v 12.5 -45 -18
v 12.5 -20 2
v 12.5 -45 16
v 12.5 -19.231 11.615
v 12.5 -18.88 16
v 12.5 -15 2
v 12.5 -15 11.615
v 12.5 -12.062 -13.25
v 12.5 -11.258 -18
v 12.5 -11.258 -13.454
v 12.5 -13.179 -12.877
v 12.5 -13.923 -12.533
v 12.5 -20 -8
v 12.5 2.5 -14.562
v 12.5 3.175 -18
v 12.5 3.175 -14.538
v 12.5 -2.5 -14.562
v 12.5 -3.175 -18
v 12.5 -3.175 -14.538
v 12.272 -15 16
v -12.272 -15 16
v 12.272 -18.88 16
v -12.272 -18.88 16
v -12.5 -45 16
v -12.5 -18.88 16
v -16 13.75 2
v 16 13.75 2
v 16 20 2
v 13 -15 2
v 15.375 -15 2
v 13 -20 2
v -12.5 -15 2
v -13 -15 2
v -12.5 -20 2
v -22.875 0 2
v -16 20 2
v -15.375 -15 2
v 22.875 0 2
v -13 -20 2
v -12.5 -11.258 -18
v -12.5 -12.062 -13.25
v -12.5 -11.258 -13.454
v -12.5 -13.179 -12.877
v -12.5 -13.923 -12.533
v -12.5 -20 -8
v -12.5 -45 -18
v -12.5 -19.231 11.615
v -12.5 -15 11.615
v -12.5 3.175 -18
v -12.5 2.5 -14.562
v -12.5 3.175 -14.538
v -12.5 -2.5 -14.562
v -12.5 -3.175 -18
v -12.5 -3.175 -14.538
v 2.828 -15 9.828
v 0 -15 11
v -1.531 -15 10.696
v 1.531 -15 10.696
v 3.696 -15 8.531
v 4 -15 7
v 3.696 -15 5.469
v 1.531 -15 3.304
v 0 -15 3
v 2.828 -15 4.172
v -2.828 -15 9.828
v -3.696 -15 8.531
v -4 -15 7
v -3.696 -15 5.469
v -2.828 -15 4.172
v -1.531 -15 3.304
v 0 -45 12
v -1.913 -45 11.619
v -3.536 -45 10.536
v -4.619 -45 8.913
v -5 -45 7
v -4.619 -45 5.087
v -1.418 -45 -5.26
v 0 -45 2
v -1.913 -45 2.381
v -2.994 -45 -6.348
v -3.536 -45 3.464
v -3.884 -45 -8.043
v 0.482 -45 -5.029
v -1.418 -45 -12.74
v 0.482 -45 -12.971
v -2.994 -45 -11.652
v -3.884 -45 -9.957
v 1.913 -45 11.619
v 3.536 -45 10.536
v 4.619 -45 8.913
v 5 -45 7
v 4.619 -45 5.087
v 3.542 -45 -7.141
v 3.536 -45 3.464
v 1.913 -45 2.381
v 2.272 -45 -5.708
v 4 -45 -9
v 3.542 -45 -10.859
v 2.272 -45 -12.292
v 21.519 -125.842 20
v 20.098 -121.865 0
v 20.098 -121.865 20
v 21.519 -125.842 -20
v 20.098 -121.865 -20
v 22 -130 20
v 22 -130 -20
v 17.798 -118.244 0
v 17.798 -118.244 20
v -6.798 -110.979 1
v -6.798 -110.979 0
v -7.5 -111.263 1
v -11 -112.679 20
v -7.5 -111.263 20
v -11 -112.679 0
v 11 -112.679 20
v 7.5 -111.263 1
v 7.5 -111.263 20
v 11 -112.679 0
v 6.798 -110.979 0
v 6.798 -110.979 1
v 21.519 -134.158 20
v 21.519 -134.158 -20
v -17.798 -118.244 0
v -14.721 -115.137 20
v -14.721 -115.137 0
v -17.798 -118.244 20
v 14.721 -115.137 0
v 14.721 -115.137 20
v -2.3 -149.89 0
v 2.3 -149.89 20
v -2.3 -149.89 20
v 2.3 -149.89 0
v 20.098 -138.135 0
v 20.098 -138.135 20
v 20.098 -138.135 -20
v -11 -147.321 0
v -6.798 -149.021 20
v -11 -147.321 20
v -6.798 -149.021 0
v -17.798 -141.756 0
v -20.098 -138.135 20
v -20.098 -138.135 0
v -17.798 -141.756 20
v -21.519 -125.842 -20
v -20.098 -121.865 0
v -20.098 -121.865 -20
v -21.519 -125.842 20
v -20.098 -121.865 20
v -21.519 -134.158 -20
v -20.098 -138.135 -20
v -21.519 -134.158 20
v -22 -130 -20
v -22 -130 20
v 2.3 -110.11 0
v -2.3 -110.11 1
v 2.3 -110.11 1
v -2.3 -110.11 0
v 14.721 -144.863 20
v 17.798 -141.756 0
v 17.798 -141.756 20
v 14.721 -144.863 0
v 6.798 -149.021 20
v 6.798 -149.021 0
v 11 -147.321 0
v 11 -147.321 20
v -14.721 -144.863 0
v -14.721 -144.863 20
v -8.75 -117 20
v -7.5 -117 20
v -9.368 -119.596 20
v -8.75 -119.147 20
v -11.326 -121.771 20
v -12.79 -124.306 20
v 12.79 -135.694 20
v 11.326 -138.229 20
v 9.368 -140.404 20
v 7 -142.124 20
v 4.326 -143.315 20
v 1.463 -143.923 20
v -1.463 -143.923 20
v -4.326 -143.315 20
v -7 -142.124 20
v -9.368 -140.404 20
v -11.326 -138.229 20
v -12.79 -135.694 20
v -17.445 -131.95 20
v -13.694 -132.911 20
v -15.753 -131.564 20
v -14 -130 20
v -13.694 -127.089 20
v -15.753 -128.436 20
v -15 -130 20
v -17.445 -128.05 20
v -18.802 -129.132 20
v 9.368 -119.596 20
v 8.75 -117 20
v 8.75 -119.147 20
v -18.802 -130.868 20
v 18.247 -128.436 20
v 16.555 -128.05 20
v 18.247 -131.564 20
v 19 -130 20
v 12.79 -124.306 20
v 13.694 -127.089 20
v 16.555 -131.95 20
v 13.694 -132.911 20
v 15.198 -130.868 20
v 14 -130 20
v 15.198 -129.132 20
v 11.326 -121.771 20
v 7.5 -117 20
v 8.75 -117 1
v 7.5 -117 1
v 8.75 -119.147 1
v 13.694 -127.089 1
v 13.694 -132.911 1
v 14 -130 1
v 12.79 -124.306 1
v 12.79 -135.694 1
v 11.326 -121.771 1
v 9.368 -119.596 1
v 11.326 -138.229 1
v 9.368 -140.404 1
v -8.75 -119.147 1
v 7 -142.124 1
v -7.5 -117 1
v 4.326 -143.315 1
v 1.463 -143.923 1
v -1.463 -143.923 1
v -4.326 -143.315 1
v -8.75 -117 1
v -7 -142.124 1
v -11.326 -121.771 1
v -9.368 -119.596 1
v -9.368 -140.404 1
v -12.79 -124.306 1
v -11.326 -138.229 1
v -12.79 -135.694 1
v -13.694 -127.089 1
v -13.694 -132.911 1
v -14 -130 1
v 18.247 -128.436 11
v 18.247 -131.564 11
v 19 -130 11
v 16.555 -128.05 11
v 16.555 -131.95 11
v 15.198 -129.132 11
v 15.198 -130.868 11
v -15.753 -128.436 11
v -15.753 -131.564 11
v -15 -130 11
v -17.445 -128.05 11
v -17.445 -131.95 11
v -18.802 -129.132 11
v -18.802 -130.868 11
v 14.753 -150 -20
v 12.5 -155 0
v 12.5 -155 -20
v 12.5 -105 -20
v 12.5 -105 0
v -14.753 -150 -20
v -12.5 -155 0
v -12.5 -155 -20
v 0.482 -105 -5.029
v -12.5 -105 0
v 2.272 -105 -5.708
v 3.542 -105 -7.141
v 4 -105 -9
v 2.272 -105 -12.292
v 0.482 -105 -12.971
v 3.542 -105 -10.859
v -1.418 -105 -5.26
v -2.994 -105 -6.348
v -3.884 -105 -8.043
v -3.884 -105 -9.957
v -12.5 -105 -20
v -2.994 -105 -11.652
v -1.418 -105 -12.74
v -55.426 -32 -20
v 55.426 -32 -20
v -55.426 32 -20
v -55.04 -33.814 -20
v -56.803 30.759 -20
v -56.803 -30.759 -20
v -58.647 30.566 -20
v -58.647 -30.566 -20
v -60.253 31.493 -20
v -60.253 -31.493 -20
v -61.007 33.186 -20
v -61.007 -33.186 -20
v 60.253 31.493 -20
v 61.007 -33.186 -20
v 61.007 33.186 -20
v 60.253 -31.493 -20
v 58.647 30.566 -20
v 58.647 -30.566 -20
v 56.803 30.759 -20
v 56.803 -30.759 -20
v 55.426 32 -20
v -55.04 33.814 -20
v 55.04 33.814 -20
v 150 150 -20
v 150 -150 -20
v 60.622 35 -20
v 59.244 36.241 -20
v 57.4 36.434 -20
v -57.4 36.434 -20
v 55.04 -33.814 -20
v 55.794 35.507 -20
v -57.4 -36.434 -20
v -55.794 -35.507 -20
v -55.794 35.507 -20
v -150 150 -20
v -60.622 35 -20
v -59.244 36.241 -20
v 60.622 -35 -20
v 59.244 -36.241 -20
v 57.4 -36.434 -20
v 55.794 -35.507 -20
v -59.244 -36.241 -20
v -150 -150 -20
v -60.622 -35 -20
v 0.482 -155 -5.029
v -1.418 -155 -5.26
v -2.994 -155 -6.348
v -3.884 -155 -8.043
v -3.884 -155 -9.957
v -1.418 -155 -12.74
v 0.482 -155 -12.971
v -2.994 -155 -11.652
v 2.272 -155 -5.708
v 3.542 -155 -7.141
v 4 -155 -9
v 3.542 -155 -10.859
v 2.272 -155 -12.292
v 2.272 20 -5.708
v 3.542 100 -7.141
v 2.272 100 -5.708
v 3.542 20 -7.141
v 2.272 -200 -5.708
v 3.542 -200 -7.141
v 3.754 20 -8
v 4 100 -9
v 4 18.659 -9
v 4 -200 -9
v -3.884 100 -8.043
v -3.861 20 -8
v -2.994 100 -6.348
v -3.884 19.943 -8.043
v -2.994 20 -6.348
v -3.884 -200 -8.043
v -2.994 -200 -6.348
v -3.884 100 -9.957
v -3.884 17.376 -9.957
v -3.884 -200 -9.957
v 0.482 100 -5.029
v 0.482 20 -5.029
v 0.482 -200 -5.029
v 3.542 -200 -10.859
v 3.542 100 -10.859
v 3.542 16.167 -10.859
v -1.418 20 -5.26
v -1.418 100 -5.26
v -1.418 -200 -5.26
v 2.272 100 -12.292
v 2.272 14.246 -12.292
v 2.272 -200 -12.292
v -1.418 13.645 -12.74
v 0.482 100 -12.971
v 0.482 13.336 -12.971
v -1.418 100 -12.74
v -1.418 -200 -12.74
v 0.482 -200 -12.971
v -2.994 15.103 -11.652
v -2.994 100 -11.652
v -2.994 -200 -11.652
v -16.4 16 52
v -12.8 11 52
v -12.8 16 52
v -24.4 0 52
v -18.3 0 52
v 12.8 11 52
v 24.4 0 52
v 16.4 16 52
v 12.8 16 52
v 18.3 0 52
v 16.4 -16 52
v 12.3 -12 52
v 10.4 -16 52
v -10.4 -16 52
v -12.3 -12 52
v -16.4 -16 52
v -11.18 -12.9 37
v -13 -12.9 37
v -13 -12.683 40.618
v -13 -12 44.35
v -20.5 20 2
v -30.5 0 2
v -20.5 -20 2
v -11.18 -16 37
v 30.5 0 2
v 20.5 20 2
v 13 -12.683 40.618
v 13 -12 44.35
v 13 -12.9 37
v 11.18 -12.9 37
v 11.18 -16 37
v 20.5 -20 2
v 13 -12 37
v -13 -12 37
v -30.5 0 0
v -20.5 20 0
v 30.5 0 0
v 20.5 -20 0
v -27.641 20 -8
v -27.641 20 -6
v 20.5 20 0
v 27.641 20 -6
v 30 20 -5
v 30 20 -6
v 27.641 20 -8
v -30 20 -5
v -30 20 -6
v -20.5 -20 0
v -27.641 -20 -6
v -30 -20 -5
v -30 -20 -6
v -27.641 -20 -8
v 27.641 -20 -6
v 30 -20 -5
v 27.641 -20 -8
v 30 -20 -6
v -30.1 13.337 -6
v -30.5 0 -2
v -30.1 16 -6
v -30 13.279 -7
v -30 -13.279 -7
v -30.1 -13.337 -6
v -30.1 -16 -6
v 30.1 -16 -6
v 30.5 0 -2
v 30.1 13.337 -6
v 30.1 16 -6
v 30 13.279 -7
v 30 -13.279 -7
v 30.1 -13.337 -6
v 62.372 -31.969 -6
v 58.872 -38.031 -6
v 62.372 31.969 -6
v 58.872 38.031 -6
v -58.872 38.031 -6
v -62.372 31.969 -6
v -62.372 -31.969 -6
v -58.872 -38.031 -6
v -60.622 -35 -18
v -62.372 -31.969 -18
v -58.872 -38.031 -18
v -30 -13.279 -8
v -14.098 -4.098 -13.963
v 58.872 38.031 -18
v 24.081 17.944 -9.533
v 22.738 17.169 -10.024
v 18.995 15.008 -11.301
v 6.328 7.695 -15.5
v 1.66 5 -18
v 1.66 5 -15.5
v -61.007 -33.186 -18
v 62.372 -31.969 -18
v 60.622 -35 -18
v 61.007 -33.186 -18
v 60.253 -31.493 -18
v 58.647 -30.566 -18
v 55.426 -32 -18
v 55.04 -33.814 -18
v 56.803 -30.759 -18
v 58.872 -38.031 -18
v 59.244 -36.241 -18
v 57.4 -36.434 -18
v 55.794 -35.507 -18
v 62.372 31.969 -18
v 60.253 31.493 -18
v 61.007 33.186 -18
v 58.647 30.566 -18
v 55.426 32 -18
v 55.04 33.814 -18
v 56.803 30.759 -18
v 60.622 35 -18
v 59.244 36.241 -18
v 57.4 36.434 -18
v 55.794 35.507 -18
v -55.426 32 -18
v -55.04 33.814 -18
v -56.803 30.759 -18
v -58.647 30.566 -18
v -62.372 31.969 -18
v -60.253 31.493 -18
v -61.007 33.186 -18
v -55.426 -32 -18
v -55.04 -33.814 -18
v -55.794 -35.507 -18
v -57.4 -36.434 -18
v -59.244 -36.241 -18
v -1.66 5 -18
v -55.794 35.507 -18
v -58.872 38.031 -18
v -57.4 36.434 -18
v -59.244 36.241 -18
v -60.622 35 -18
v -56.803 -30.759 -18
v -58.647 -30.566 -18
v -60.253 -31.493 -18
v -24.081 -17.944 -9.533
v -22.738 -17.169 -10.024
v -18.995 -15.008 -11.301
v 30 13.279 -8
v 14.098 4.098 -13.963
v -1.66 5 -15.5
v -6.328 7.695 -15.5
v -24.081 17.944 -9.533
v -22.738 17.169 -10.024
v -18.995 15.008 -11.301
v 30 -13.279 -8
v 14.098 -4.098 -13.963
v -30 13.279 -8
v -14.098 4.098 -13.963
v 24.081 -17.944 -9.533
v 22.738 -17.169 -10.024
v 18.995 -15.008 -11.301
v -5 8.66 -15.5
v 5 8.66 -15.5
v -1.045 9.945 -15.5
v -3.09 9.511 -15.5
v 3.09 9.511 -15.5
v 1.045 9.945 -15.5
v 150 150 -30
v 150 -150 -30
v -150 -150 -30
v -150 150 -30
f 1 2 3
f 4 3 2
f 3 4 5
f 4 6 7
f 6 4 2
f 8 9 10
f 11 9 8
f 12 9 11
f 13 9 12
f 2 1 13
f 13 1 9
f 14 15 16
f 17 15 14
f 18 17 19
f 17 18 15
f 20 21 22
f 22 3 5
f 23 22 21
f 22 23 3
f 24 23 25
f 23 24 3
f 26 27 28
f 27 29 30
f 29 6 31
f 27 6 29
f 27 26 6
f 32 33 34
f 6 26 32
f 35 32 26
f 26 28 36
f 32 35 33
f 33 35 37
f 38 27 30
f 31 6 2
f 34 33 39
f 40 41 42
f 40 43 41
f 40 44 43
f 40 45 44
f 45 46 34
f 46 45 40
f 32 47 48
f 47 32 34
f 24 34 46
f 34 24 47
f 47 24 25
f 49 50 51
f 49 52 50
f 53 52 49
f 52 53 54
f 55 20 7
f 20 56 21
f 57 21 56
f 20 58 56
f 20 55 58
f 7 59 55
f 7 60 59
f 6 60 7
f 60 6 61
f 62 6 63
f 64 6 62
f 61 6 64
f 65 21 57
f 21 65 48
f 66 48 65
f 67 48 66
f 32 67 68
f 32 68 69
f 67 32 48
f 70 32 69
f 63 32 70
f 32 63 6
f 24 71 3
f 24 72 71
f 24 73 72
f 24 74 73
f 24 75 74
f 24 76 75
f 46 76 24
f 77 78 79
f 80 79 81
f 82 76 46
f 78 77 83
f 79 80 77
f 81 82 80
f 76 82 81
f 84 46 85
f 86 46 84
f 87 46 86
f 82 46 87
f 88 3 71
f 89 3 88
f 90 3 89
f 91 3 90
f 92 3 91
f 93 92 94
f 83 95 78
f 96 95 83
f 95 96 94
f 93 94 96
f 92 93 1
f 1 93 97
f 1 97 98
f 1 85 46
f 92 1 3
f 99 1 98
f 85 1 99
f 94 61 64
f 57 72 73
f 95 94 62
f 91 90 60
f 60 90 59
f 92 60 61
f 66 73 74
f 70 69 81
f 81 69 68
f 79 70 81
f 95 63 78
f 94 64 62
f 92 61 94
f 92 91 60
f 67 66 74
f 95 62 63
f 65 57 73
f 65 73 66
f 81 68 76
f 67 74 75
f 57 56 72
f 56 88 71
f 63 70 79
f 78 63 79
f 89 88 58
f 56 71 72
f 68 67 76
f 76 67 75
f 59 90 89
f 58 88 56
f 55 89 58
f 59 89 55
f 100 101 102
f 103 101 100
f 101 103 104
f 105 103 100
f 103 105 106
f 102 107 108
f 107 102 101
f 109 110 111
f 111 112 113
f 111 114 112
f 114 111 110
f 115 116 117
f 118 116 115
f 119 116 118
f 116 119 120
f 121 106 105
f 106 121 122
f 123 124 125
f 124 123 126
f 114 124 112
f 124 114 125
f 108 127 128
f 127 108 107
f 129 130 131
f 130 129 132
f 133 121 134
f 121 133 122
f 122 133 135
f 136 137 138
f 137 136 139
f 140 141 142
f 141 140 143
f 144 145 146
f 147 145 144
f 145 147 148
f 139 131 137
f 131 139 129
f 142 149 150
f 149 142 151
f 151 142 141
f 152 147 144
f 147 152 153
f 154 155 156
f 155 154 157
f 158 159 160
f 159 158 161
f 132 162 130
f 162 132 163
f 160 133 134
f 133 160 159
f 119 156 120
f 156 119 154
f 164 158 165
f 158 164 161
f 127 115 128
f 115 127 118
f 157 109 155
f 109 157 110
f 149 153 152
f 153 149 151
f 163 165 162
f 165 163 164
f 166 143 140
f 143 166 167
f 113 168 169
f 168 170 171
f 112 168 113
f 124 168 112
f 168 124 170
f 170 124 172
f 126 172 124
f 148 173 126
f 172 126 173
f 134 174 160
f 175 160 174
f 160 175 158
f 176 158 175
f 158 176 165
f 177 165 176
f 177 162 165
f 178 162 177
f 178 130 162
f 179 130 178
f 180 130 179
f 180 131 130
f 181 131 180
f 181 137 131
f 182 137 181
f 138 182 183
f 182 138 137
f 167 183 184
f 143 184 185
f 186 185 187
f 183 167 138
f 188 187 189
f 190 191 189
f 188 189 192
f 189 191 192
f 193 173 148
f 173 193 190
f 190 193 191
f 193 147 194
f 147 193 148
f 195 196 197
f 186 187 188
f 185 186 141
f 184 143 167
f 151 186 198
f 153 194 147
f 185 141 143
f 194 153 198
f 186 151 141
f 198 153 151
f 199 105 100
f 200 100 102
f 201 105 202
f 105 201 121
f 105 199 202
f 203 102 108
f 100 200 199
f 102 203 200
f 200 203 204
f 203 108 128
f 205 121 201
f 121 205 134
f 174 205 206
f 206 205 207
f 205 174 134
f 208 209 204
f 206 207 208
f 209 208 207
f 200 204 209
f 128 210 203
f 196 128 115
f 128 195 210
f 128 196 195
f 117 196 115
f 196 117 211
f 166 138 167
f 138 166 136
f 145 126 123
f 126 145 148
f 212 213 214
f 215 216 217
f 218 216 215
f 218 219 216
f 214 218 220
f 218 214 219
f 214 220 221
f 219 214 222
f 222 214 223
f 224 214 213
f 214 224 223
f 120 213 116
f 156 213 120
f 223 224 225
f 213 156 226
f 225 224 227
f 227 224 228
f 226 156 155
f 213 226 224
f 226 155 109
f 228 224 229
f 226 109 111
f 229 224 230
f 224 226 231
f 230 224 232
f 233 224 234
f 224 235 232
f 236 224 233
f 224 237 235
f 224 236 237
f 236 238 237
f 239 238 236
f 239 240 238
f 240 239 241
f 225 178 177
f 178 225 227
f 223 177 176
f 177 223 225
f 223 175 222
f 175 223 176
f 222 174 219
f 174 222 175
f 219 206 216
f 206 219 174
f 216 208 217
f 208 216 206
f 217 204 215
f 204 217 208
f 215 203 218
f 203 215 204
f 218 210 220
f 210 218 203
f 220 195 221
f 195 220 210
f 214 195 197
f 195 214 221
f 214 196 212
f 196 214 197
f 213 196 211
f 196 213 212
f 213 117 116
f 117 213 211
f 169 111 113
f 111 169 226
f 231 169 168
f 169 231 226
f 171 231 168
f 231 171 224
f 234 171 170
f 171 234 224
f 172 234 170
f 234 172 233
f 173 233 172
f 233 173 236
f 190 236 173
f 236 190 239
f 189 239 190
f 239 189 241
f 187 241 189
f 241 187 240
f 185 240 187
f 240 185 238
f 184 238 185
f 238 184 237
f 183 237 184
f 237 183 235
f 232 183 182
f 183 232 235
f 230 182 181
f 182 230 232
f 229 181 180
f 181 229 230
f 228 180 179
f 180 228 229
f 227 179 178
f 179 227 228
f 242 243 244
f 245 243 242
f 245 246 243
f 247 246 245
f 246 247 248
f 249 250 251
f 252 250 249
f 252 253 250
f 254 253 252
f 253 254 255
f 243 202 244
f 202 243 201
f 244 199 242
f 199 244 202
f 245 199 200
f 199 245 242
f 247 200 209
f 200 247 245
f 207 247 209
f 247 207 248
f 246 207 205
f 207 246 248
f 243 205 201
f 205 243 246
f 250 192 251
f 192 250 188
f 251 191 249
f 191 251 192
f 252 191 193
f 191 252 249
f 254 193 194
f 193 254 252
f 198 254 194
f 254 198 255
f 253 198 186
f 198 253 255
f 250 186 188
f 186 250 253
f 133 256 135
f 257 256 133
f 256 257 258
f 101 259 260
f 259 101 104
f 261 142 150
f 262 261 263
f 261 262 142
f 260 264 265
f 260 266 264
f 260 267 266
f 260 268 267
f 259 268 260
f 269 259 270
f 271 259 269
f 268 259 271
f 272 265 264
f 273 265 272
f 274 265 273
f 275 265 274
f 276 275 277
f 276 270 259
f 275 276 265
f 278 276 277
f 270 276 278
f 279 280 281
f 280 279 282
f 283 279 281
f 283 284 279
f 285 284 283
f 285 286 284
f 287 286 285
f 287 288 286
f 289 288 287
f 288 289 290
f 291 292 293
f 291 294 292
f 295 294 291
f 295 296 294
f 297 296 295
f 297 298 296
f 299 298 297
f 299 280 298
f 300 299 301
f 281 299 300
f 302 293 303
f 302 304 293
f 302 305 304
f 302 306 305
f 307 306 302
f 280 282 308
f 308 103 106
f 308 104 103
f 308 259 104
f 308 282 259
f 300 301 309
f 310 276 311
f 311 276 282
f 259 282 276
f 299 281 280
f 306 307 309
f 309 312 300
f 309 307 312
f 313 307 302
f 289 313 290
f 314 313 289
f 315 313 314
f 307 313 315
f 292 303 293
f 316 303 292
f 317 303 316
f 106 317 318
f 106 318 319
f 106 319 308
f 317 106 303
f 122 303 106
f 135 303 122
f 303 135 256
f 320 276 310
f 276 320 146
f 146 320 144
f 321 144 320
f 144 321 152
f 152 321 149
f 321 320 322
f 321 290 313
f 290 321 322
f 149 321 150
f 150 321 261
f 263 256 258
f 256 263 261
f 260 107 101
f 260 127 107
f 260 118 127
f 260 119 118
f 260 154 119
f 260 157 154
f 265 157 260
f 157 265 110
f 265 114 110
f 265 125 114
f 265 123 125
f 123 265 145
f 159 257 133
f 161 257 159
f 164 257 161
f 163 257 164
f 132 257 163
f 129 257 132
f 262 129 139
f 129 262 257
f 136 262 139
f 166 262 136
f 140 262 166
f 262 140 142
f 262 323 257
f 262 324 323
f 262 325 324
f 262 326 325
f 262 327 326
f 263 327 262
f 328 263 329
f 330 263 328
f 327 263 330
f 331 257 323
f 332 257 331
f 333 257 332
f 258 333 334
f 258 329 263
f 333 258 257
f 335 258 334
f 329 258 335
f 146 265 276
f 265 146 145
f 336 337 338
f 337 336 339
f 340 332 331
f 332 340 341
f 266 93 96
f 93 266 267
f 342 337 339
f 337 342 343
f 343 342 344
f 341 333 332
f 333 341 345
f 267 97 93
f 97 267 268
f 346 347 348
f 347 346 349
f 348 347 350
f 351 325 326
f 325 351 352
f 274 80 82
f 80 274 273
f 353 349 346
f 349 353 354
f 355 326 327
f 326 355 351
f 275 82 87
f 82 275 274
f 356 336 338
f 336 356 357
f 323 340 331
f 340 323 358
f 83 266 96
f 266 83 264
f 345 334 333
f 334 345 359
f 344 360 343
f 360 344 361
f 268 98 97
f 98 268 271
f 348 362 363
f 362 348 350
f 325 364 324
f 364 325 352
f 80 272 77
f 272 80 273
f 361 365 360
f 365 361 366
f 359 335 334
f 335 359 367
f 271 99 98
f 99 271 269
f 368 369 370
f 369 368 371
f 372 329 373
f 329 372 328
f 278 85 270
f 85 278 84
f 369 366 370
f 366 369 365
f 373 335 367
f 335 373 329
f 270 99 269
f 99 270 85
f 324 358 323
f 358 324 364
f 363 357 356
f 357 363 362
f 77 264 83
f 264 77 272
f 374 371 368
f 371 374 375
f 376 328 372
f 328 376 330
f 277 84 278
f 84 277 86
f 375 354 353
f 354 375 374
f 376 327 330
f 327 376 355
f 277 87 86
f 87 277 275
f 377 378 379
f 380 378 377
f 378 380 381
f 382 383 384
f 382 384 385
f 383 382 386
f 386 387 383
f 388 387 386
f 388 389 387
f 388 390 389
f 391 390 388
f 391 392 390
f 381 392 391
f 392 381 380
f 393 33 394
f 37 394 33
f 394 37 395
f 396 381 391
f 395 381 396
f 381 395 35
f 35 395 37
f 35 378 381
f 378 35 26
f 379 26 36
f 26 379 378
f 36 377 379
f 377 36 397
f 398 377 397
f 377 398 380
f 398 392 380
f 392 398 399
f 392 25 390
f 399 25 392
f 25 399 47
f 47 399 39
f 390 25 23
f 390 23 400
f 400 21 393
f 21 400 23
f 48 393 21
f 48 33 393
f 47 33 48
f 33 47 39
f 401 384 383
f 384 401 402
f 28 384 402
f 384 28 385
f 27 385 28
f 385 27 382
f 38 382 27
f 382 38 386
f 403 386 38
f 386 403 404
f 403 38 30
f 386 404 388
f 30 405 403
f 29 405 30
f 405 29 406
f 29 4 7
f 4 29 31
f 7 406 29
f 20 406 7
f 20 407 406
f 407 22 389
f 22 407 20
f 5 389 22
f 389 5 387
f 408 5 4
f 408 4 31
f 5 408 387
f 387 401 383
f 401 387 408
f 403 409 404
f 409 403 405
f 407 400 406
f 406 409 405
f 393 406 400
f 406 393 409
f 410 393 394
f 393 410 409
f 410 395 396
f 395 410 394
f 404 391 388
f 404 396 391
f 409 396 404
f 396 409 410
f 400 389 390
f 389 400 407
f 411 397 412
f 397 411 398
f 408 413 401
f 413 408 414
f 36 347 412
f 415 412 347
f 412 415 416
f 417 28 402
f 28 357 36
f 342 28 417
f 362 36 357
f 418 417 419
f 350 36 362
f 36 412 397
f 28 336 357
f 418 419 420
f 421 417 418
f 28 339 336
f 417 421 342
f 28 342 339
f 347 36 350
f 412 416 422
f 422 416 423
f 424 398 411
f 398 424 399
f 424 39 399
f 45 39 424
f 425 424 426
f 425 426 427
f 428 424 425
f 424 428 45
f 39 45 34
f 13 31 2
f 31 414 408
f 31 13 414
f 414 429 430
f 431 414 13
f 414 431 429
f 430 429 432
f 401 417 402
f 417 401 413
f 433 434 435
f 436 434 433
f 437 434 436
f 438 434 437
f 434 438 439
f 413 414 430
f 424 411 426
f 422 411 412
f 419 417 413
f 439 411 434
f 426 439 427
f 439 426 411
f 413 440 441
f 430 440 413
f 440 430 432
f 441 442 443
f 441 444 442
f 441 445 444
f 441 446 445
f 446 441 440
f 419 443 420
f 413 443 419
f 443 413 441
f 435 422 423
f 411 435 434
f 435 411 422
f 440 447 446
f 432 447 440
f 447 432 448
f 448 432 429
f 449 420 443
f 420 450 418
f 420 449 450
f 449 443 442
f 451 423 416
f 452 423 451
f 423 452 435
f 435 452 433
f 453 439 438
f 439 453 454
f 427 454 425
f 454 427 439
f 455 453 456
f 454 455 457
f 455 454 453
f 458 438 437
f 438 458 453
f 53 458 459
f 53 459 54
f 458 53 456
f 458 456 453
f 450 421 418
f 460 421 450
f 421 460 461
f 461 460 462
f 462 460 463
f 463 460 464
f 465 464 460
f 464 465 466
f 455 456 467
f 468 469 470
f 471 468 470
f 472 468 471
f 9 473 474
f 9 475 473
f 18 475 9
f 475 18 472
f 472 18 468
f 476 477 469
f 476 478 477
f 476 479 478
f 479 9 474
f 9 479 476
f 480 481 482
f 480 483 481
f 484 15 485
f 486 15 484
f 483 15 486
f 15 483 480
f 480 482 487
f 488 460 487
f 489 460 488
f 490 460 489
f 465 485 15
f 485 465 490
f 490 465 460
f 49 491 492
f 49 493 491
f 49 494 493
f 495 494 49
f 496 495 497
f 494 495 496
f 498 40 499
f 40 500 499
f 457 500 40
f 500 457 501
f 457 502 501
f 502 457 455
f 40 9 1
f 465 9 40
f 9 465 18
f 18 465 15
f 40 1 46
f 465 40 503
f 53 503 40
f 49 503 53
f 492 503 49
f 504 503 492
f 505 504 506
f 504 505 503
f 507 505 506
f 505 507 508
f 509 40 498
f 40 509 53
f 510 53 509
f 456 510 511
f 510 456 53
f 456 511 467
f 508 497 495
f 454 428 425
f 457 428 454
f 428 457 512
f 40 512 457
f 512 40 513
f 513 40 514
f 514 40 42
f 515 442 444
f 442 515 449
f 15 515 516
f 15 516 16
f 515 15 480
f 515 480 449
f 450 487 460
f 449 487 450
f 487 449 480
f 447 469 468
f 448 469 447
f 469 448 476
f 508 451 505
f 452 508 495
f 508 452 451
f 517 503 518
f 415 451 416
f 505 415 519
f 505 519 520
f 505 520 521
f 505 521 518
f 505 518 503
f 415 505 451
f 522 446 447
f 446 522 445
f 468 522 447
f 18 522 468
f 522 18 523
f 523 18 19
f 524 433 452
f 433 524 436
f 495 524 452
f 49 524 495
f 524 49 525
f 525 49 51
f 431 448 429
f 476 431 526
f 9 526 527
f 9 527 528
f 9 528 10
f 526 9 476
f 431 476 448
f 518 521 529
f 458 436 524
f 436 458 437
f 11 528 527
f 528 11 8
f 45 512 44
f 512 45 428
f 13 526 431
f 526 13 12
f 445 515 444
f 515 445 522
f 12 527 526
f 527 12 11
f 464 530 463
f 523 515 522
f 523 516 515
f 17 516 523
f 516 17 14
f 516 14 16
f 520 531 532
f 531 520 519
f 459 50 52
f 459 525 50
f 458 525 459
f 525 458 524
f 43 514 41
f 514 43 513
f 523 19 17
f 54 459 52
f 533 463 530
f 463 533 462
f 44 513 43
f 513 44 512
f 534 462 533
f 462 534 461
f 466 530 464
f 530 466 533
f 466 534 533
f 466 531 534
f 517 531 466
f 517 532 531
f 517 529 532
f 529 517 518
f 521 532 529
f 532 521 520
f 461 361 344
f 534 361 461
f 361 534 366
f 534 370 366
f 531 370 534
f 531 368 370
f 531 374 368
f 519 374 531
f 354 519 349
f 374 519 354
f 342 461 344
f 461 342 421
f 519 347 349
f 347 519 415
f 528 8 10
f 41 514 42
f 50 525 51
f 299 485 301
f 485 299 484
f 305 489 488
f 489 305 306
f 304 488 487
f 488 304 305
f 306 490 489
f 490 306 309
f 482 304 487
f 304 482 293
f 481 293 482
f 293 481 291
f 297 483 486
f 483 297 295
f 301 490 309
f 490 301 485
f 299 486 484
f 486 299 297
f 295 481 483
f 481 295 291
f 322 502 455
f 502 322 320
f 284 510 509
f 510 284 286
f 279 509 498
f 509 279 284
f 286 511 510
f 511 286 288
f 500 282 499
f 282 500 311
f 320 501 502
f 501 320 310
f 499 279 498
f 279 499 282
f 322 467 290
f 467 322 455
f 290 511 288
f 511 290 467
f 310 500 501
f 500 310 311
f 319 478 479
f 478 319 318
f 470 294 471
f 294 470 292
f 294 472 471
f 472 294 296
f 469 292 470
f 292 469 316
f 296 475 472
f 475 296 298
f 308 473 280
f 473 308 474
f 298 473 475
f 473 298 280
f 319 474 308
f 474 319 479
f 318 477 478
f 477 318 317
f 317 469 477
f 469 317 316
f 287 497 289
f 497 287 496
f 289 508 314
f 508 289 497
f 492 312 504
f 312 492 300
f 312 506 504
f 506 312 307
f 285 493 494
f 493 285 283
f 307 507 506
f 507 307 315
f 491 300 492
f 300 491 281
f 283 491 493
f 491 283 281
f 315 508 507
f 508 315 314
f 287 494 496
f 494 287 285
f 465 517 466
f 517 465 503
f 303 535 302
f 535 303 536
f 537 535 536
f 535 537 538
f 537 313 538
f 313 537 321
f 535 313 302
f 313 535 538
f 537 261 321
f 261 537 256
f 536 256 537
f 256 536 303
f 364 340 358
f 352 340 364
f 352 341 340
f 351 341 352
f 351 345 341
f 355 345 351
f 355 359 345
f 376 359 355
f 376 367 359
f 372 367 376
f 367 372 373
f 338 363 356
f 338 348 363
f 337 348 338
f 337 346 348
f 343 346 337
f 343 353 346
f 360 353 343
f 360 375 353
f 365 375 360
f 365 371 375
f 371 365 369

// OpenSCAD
//baseplate
%translate([-29.5,-20,50])difference(){
	cube([59,40,6]);
	color("green")translate([26,17,-1]){
		cube([7,26,8]);
		translate([3.5,0,0])cylinder(8,3.5,3.5);
	}
}
scale_factor = 0.8;
path_base_pillar =[[-20.5,-20],[20.5,-20],[30.5,0],[20.5,20],[-20.5,20],[-30.5,0]];
// hexagonal pillars
translate([0,0,2]) linear_extrude(height = 50, center = false, convexity = 10, scale=scale_factor)
difference(){
	color("red") polygon(path_base_pillar);
	polygon(path_base_pillar*0.75);
	color("green")translate([0,18,0])square([32,10],true);
	color("green")translate([0,-18,0])square([26,10],true);
}
// linking block
color("purple")translate([-13,-16,37])cube([26,4,15]);

color("DarkKhaki")
translate([0,0,0])linear_extrude(height = 2, center = false, convexity = 10)
polygon(path_base_pillar);

color("steelblue")hull(){
	translate([0,0,-2])linear_extrude(height = 2, center = false, convexity = 10)
	polygon(path_base_pillar);
	translate([0,0,-6])cube([60,40,2], true);
}
// legs
color("gray")translate([0,0,-12])rotate([0,0,30])cube([140,7,12],true);
color("gray")translate([0,0,-12])rotate([0,0,-30])cube([140,7,12],true);

color("lime")hull(){
	translate([0,0,-7])cube([60,40,2], true);
	translate([0,0,-15])cylinder(1,10,10,true);
}



rotate([0,0,30])translate([67,0,-20])cylinder(2,3,3);
rotate([0,0,30])translate([-67,0,-20])cylinder(2,3,3);
rotate([0,0,-30])translate([67,0,-20])cylinder(2,3,3);
rotate([0,0,-30])translate([-67,0,-20])cylinder(2,3,3);
// linking to motor
/*
difference(){
	translate([0,-21,-12])cube([25,50,12],true);

	color("red") translate([0,-68,-18])
	linear_extrude(height = 12, center = false, convexity = 10)
	polygon([ [0,0], [8,30], [-8,30] ]);
}
*/

translate([-12.5,-45,-18])cube([25,50,12]);

color("red")translate([-12.5,-45,-6])cube([25,25,8]);
difference(){
	color("crimson")translate([-12.5,-45,2])cube([25,30,14]);
	translate([0,-15,7])rotate([90,0,0])cylinder(30,4,5);
}


// MOTOR HOLDER 
translate([0,-130,-4]){
	difference(){
		scale([1.1,1])cylinder(24, 20,20);

		color("blue")translate([0,0,5])linear_extrude(height = 19.3, center = false){
			circle(14);
			translate([0,8,0])square([17.5,10],true);
			translate([0,15,0]) square([15,10],true);
		}

		color("green")translate([0,0,15])linear_extrude(height = 10, center = false){
			translate([17,0,0])circle(2);
			translate([-17,0,0])circle(2);
		}
	}

	difference(){
		translate([0,0,-16])linear_extrude(height = 20, center = false)hull(){
			scale([1.1,1])circle(20);
			translate([0,20,0])square([25,10],true);
			translate([0,-20,0])square([25,10],true);
		}

		rotate([90,0,0])translate([0,-5,0])cylinder(60,4,4,true);
		}
}
//floor
color("olive")translate([0,0,-25])cube([300,300,10],true);

// screw
color("blue")rotate([90,0,0])translate([0,-9,50])cylinder(300,4,4,true);
		
